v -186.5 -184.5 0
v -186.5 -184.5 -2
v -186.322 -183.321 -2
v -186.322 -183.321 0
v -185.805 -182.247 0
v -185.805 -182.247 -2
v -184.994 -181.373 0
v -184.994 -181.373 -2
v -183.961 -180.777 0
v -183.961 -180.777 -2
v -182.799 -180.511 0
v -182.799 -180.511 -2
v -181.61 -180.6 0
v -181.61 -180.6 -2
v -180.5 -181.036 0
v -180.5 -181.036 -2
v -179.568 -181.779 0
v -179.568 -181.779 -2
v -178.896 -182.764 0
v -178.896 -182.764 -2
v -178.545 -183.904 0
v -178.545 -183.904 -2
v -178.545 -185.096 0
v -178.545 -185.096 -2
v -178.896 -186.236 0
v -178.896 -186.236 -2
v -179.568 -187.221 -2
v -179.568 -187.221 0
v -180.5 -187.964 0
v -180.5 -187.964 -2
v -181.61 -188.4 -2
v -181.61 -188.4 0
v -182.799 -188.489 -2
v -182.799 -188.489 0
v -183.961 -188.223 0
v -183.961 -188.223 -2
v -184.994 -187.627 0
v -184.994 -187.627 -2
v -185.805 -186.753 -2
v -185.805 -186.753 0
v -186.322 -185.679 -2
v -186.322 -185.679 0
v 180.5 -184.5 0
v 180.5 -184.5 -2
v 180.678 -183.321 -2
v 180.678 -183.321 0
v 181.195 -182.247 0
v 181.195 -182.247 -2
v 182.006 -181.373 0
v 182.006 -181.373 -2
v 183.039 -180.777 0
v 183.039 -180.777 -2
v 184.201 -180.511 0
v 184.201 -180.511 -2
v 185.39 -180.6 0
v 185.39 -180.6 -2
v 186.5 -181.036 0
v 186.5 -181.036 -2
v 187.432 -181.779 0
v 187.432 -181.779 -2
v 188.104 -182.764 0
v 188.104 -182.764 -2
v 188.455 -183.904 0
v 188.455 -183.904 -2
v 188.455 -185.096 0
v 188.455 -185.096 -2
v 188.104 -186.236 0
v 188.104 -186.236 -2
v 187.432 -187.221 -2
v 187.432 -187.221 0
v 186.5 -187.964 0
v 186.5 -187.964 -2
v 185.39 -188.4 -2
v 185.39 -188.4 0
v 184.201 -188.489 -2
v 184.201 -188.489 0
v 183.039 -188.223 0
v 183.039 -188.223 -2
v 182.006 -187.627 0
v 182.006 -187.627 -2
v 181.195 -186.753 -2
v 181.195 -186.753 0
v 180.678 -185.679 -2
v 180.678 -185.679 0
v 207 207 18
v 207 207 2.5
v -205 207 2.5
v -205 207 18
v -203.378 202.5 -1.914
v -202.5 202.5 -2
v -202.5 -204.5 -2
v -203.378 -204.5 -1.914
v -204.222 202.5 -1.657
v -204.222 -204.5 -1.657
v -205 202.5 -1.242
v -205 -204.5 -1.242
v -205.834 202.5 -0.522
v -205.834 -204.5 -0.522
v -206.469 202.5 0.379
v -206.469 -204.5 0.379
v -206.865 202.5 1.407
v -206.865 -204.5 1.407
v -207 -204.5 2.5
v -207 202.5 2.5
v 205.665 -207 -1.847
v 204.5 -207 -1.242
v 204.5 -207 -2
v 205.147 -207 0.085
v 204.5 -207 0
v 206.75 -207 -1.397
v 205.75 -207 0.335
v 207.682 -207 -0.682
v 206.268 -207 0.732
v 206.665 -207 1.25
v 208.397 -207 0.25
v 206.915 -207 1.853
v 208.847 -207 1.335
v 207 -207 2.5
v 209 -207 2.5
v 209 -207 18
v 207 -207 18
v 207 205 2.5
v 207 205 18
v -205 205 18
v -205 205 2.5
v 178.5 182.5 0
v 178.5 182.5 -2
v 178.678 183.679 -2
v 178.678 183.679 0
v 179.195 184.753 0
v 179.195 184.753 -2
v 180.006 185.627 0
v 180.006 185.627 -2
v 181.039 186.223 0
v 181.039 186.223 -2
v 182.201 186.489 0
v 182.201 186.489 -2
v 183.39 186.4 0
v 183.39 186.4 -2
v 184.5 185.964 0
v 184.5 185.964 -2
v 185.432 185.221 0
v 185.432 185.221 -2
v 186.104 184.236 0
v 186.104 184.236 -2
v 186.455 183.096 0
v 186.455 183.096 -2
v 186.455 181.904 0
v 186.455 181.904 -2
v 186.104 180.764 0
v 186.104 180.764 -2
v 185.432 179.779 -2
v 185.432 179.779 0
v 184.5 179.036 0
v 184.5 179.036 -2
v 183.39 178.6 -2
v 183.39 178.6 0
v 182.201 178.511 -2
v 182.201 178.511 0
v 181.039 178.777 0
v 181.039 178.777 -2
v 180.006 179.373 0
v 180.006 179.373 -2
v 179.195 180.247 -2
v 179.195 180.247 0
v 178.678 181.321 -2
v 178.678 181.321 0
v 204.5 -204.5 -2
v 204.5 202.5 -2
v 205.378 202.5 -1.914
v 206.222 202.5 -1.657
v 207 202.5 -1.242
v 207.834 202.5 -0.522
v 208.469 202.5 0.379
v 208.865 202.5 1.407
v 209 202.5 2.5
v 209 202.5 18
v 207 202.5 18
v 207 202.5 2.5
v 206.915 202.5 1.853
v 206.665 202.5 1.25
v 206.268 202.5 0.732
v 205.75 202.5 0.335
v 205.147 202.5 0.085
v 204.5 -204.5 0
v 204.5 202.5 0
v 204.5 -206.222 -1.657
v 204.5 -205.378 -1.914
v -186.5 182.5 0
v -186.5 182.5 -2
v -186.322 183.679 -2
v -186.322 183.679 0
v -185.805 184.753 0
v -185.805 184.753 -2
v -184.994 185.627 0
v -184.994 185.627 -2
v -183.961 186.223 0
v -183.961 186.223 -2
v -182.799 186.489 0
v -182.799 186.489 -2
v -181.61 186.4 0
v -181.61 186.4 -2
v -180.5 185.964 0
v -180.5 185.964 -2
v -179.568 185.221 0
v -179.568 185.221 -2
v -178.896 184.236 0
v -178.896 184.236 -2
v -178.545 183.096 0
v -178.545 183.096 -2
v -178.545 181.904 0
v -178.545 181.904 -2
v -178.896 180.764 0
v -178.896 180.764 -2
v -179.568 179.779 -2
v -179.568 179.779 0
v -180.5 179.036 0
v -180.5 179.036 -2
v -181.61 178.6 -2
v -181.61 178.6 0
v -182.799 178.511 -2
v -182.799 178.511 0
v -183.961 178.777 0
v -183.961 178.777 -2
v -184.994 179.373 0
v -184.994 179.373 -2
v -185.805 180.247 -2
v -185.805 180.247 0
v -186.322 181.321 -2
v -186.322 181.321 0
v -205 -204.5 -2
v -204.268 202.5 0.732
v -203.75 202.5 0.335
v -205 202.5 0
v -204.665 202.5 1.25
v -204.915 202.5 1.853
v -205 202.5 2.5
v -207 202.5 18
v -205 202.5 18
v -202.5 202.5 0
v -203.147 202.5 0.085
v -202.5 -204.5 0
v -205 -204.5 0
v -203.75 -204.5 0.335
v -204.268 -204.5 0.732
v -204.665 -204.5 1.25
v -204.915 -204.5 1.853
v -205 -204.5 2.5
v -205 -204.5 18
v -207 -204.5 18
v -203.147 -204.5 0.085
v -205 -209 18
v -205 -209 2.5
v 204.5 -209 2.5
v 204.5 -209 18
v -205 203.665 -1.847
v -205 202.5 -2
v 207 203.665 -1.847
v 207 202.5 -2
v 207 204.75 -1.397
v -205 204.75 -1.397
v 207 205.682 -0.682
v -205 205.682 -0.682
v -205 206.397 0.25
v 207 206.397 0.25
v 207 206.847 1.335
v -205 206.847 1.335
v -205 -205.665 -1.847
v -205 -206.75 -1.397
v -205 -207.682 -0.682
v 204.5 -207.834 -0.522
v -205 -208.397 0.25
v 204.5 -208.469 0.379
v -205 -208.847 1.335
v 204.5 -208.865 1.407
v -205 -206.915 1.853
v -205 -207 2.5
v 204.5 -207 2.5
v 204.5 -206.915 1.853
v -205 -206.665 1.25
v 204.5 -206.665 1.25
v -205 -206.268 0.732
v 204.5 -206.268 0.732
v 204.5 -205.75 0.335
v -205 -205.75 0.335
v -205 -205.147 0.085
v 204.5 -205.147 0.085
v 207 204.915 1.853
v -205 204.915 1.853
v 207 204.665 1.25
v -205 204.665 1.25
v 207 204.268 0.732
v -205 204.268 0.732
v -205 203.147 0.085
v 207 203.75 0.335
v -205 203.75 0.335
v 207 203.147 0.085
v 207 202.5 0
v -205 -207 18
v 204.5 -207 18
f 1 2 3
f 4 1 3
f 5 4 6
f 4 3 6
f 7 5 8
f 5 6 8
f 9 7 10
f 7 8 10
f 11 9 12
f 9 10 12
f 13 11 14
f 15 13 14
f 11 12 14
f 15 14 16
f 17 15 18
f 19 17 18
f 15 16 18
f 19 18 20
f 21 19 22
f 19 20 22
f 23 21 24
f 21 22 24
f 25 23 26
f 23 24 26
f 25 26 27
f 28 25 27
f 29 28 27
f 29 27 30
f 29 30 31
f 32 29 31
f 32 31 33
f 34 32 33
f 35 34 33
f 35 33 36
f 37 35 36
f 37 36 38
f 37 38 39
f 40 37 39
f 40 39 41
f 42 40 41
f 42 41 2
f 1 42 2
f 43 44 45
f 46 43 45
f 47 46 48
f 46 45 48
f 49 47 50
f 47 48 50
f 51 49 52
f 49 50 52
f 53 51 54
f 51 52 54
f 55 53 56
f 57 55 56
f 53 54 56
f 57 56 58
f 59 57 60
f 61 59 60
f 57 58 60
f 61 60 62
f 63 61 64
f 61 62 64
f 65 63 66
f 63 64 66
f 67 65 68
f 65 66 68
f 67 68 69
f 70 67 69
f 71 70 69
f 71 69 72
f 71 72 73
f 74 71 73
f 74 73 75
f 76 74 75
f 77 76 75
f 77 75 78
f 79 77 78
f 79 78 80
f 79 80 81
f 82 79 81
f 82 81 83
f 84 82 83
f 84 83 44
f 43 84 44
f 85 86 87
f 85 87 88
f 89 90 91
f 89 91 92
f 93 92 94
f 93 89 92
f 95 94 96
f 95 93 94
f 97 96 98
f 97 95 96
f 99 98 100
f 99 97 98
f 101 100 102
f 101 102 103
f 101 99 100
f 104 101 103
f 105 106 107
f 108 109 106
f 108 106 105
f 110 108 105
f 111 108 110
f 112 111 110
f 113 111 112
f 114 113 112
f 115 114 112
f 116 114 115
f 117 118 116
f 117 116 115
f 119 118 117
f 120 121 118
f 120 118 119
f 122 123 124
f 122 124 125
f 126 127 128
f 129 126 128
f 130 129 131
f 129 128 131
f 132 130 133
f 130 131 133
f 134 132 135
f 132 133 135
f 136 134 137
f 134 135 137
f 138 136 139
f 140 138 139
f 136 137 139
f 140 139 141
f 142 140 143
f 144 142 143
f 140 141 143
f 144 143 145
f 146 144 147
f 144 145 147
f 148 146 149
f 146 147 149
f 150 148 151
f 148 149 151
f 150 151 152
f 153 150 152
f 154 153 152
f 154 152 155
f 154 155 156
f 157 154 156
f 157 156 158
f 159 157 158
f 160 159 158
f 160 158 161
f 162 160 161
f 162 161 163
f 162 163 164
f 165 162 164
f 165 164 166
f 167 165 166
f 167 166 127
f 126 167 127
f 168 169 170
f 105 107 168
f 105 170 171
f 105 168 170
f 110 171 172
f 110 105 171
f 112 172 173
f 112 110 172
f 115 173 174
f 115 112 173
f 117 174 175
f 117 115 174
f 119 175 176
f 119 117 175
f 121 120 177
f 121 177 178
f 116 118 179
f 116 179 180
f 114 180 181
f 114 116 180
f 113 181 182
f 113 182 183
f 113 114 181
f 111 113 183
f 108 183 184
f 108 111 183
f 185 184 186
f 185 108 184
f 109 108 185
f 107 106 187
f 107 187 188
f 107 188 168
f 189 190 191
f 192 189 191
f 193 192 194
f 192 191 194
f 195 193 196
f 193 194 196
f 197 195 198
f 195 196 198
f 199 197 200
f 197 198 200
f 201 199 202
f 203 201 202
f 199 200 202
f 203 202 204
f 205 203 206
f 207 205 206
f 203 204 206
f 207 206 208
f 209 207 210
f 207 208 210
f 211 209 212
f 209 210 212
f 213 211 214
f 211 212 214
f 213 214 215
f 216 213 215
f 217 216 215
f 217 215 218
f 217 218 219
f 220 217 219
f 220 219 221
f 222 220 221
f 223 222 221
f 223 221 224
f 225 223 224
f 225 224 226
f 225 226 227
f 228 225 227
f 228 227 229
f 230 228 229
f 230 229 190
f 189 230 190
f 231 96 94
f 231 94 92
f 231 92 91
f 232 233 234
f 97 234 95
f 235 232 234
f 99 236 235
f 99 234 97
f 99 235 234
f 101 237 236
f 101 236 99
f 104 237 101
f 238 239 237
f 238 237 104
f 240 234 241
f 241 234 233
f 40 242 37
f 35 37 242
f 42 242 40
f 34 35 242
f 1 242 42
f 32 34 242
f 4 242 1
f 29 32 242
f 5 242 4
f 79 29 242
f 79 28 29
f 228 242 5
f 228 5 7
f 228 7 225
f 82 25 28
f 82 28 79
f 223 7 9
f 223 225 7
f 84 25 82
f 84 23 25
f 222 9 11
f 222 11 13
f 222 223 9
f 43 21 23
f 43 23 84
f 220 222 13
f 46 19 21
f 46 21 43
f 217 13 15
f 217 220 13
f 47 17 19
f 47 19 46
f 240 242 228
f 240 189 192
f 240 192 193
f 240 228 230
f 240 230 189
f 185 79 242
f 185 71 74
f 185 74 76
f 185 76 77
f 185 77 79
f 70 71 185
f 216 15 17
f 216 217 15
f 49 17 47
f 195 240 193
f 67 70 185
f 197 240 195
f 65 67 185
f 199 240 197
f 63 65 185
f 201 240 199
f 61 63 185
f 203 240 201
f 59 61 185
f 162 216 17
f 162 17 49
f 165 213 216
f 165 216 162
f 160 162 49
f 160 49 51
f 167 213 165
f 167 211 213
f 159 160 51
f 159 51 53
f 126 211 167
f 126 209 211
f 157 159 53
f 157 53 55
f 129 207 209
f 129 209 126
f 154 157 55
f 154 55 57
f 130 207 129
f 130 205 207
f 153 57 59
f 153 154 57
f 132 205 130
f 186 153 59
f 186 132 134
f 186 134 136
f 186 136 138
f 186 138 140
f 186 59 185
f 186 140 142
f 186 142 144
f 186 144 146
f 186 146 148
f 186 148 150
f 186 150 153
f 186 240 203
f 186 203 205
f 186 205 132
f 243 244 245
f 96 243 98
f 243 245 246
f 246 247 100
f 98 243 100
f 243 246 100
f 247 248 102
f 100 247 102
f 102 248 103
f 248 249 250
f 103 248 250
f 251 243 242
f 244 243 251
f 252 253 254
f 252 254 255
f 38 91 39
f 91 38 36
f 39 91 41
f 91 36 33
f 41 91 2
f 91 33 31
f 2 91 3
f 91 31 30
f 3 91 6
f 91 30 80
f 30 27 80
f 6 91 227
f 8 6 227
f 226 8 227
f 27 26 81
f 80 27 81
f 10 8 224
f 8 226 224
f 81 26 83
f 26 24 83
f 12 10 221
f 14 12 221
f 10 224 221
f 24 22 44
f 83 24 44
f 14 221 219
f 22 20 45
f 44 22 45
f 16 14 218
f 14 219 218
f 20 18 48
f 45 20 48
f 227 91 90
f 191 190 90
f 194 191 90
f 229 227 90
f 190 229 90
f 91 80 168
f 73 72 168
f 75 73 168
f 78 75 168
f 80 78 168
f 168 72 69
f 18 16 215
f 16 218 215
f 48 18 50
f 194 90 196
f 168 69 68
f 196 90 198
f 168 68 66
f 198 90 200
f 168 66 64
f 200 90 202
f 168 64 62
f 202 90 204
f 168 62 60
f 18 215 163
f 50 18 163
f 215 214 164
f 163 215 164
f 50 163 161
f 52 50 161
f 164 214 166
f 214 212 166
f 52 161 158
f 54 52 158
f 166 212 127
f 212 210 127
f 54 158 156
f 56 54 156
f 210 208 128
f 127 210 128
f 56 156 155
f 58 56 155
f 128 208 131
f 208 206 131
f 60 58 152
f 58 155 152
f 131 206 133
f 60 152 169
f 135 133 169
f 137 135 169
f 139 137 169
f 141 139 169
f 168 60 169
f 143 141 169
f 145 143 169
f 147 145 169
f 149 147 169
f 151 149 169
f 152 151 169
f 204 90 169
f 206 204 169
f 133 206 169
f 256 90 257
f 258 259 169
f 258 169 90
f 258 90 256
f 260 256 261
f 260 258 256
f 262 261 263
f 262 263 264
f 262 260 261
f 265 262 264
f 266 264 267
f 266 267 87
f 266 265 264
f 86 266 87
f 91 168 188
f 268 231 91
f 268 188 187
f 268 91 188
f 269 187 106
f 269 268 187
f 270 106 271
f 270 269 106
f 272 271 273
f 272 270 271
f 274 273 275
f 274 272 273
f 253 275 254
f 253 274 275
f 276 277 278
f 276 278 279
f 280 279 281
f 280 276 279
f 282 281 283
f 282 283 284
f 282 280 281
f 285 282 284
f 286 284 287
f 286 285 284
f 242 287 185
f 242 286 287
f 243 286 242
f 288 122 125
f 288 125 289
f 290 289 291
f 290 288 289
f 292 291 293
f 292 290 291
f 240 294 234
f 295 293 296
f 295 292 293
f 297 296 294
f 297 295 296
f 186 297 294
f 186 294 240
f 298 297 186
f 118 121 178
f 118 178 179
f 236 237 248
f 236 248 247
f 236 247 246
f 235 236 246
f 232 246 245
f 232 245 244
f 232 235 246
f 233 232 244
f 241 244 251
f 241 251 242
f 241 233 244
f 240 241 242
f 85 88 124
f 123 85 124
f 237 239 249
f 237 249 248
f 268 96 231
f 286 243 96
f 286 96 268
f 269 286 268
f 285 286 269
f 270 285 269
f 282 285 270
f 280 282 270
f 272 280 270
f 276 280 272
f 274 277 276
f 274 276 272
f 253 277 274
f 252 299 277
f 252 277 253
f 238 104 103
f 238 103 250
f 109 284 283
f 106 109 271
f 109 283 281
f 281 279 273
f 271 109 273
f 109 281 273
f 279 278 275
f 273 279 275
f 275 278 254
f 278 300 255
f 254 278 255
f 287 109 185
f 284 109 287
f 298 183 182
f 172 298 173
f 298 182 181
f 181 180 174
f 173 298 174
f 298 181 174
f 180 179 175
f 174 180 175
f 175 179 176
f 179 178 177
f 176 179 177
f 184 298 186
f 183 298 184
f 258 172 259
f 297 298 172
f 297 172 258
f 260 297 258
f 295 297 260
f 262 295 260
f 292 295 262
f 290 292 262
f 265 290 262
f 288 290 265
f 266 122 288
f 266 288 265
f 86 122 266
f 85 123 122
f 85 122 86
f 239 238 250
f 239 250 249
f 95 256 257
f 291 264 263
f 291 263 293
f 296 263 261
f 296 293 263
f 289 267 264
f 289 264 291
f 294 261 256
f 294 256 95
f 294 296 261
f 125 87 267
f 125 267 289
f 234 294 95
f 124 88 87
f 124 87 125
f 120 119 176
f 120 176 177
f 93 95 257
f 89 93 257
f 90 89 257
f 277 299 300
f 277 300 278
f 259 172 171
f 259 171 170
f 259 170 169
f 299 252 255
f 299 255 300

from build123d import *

# Parameters (mm, degrees)
SKETCH1_W                    = 412
SKETCH1_H                    = 412
BASE_FLANGE1_DEPTH           = 2
EDGE_FLANGE1_STRIP_W         = 13
EDGE_FLANGE1_STRIP_H         = 2
EDGE_FLANGE1_STRIP_CUT_DEPTH = 412
EDGE_FLANGE1_DEPTH           = 412
EDGE_FLANGE2_STRIP_W         = 13
EDGE_FLANGE2_STRIP_H         = 2
EDGE_FLANGE2_STRIP_CUT_DEPTH = 409.5
EDGE_FLANGE2_DEPTH           = 409.5
EDGE_FLANGE3_STRIP_W         = 13
EDGE_FLANGE3_STRIP_H         = 2
EDGE_FLANGE3_STRIP_CUT_DEPTH = 409.5
EDGE_FLANGE3_DEPTH           = 409.5
EDGE_FLANGE4_STRIP_W         = 13
EDGE_FLANGE4_STRIP_H         = 2
EDGE_FLANGE4_STRIP_CUT_DEPTH = 407
EDGE_FLANGE4_DEPTH           = 407
SKETCH18_R                   = 4
CUT_EXTRUDE1_DEPTH           = 10


# Sheet-metal steps are written as plain solids
with BuildPart() as part:
    # Sketch1 → Base-Flange1 (new body)
    with BuildSketch(Plane.XY):
        with Locations((1, -1)):
            Rectangle(SKETCH1_W, SKETCH1_H)
    extrude(amount=-BASE_FLANGE1_DEPTH)

    # Edge-Flange1 strip (across the edge) → Edge-Flange1 strip cut (cut)
    with BuildSketch(Plane(origin=(207, 205, 0), x_dir=(0, -1, 0), z_dir=(-1, 0, 0))):
        with Locations((-4, -1)):
            Rectangle(EDGE_FLANGE1_STRIP_W, EDGE_FLANGE1_STRIP_H)
    extrude(amount=EDGE_FLANGE1_STRIP_CUT_DEPTH, mode=Mode.SUBTRACT)

    # Edge-Flange1 section (across the edge) → Edge-Flange1 (add)
    with BuildSketch(Plane(origin=(207, 205, 0), x_dir=(0, -1, 0), z_dir=(-1, 0, 0))):
        with BuildLine():
            Line((-2, 2.5), (-2, 18))
            Line((-2, 18), (0, 18))
            Line((0, 18), (0, 2.5))
            ThreePointArc((0, 2.5), (0.732233047, 0.732233047), (2.5, 0))
            Line((2.5, 0), (2.5, -2))
            ThreePointArc((2.5, -2), (-0.681980515, -0.681980515), (-2, 2.5))
        make_face()
    extrude(amount=EDGE_FLANGE1_DEPTH)

    # Edge-Flange2 strip (across the edge) → Edge-Flange2 strip cut (cut)
    with BuildSketch(Plane(origin=(207, -207, 0), x_dir=(-1, 0, 0), z_dir=(0, 1, 0))):
        with Locations((-4, -1)):
            Rectangle(EDGE_FLANGE2_STRIP_W, EDGE_FLANGE2_STRIP_H)
    extrude(amount=EDGE_FLANGE2_STRIP_CUT_DEPTH, mode=Mode.SUBTRACT)

    # Edge-Flange2 section (across the edge) → Edge-Flange2 (add)
    with BuildSketch(Plane(origin=(207, -207, 0), x_dir=(-1, 0, 0), z_dir=(0, 1, 0))):
        with BuildLine():
            Line((-2, 2.5), (-2, 18))
            Line((-2, 18), (0, 18))
            Line((0, 18), (0, 2.5))
            ThreePointArc((0, 2.5), (0.732233047, 0.732233047), (2.5, 0))
            Line((2.5, 0), (2.5, -2))
            ThreePointArc((2.5, -2), (-0.681980515, -0.681980515), (-2, 2.5))
        make_face()
    extrude(amount=EDGE_FLANGE2_DEPTH)

    # Edge-Flange3 strip (across the edge) → Edge-Flange3 strip cut (cut)
    with BuildSketch(Plane(origin=(-205, -207, 0), x_dir=(0, 1, 0), z_dir=(1, 0, 0))):
        with Locations((-4, -1)):
            Rectangle(EDGE_FLANGE3_STRIP_W, EDGE_FLANGE3_STRIP_H)
    extrude(amount=EDGE_FLANGE3_STRIP_CUT_DEPTH, mode=Mode.SUBTRACT)

    # Edge-Flange3 section (across the edge) → Edge-Flange3 (add)
    with BuildSketch(Plane(origin=(-205, -207, 0), x_dir=(0, 1, 0), z_dir=(1, 0, 0))):
        with BuildLine():
            Line((-2, 2.5), (-2, 18))
            Line((-2, 18), (0, 18))
            Line((0, 18), (0, 2.5))
            ThreePointArc((0, 2.5), (0.732233047, 0.732233047), (2.5, 0))
            Line((2.5, 0), (2.5, -2))
            ThreePointArc((2.5, -2), (-0.681980515, -0.681980515), (-2, 2.5))
        make_face()
    extrude(amount=EDGE_FLANGE3_DEPTH)

    # Edge-Flange4 strip (across the edge) → Edge-Flange4 strip cut (cut)
    with BuildSketch(Plane(origin=(-205, 202.5, 0), x_dir=(1, 0, 0), z_dir=(0, -1, 0))):
        with Locations((-4, -1)):
            Rectangle(EDGE_FLANGE4_STRIP_W, EDGE_FLANGE4_STRIP_H)
    extrude(amount=EDGE_FLANGE4_STRIP_CUT_DEPTH, mode=Mode.SUBTRACT)

    # Edge-Flange4 section (across the edge) → Edge-Flange4 (add)
    with BuildSketch(Plane(origin=(-205, 202.5, 0), x_dir=(1, 0, 0), z_dir=(0, -1, 0))):
        with BuildLine():
            Line((-2, 2.5), (-2, 18))
            Line((-2, 18), (0, 18))
            Line((0, 18), (0, 2.5))
            ThreePointArc((0, 2.5), (0.732233047, 0.732233047), (2.5, 0))
            Line((2.5, 0), (2.5, -2))
            ThreePointArc((2.5, -2), (-0.681980515, -0.681980515), (-2, 2.5))
        make_face()
    extrude(amount=EDGE_FLANGE4_DEPTH)

    # Sketch18 → Cut-Extrude1 (cut)
    with BuildSketch(Plane(origin=(0, 0, -2), x_dir=(-1, 0, 0), z_dir=(0, 0, -1))):
        with Locations((-184.5, -184.5)):
            Circle(SKETCH18_R)
        with Locations((182.5, -184.5)):
            Circle(SKETCH18_R)
        with Locations((182.5, 182.5)):
            Circle(SKETCH18_R)
        with Locations((-182.5, 182.5)):
            Circle(SKETCH18_R)
    extrude(amount=-CUT_EXTRUDE1_DEPTH, mode=Mode.SUBTRACT)


solid = part.part
